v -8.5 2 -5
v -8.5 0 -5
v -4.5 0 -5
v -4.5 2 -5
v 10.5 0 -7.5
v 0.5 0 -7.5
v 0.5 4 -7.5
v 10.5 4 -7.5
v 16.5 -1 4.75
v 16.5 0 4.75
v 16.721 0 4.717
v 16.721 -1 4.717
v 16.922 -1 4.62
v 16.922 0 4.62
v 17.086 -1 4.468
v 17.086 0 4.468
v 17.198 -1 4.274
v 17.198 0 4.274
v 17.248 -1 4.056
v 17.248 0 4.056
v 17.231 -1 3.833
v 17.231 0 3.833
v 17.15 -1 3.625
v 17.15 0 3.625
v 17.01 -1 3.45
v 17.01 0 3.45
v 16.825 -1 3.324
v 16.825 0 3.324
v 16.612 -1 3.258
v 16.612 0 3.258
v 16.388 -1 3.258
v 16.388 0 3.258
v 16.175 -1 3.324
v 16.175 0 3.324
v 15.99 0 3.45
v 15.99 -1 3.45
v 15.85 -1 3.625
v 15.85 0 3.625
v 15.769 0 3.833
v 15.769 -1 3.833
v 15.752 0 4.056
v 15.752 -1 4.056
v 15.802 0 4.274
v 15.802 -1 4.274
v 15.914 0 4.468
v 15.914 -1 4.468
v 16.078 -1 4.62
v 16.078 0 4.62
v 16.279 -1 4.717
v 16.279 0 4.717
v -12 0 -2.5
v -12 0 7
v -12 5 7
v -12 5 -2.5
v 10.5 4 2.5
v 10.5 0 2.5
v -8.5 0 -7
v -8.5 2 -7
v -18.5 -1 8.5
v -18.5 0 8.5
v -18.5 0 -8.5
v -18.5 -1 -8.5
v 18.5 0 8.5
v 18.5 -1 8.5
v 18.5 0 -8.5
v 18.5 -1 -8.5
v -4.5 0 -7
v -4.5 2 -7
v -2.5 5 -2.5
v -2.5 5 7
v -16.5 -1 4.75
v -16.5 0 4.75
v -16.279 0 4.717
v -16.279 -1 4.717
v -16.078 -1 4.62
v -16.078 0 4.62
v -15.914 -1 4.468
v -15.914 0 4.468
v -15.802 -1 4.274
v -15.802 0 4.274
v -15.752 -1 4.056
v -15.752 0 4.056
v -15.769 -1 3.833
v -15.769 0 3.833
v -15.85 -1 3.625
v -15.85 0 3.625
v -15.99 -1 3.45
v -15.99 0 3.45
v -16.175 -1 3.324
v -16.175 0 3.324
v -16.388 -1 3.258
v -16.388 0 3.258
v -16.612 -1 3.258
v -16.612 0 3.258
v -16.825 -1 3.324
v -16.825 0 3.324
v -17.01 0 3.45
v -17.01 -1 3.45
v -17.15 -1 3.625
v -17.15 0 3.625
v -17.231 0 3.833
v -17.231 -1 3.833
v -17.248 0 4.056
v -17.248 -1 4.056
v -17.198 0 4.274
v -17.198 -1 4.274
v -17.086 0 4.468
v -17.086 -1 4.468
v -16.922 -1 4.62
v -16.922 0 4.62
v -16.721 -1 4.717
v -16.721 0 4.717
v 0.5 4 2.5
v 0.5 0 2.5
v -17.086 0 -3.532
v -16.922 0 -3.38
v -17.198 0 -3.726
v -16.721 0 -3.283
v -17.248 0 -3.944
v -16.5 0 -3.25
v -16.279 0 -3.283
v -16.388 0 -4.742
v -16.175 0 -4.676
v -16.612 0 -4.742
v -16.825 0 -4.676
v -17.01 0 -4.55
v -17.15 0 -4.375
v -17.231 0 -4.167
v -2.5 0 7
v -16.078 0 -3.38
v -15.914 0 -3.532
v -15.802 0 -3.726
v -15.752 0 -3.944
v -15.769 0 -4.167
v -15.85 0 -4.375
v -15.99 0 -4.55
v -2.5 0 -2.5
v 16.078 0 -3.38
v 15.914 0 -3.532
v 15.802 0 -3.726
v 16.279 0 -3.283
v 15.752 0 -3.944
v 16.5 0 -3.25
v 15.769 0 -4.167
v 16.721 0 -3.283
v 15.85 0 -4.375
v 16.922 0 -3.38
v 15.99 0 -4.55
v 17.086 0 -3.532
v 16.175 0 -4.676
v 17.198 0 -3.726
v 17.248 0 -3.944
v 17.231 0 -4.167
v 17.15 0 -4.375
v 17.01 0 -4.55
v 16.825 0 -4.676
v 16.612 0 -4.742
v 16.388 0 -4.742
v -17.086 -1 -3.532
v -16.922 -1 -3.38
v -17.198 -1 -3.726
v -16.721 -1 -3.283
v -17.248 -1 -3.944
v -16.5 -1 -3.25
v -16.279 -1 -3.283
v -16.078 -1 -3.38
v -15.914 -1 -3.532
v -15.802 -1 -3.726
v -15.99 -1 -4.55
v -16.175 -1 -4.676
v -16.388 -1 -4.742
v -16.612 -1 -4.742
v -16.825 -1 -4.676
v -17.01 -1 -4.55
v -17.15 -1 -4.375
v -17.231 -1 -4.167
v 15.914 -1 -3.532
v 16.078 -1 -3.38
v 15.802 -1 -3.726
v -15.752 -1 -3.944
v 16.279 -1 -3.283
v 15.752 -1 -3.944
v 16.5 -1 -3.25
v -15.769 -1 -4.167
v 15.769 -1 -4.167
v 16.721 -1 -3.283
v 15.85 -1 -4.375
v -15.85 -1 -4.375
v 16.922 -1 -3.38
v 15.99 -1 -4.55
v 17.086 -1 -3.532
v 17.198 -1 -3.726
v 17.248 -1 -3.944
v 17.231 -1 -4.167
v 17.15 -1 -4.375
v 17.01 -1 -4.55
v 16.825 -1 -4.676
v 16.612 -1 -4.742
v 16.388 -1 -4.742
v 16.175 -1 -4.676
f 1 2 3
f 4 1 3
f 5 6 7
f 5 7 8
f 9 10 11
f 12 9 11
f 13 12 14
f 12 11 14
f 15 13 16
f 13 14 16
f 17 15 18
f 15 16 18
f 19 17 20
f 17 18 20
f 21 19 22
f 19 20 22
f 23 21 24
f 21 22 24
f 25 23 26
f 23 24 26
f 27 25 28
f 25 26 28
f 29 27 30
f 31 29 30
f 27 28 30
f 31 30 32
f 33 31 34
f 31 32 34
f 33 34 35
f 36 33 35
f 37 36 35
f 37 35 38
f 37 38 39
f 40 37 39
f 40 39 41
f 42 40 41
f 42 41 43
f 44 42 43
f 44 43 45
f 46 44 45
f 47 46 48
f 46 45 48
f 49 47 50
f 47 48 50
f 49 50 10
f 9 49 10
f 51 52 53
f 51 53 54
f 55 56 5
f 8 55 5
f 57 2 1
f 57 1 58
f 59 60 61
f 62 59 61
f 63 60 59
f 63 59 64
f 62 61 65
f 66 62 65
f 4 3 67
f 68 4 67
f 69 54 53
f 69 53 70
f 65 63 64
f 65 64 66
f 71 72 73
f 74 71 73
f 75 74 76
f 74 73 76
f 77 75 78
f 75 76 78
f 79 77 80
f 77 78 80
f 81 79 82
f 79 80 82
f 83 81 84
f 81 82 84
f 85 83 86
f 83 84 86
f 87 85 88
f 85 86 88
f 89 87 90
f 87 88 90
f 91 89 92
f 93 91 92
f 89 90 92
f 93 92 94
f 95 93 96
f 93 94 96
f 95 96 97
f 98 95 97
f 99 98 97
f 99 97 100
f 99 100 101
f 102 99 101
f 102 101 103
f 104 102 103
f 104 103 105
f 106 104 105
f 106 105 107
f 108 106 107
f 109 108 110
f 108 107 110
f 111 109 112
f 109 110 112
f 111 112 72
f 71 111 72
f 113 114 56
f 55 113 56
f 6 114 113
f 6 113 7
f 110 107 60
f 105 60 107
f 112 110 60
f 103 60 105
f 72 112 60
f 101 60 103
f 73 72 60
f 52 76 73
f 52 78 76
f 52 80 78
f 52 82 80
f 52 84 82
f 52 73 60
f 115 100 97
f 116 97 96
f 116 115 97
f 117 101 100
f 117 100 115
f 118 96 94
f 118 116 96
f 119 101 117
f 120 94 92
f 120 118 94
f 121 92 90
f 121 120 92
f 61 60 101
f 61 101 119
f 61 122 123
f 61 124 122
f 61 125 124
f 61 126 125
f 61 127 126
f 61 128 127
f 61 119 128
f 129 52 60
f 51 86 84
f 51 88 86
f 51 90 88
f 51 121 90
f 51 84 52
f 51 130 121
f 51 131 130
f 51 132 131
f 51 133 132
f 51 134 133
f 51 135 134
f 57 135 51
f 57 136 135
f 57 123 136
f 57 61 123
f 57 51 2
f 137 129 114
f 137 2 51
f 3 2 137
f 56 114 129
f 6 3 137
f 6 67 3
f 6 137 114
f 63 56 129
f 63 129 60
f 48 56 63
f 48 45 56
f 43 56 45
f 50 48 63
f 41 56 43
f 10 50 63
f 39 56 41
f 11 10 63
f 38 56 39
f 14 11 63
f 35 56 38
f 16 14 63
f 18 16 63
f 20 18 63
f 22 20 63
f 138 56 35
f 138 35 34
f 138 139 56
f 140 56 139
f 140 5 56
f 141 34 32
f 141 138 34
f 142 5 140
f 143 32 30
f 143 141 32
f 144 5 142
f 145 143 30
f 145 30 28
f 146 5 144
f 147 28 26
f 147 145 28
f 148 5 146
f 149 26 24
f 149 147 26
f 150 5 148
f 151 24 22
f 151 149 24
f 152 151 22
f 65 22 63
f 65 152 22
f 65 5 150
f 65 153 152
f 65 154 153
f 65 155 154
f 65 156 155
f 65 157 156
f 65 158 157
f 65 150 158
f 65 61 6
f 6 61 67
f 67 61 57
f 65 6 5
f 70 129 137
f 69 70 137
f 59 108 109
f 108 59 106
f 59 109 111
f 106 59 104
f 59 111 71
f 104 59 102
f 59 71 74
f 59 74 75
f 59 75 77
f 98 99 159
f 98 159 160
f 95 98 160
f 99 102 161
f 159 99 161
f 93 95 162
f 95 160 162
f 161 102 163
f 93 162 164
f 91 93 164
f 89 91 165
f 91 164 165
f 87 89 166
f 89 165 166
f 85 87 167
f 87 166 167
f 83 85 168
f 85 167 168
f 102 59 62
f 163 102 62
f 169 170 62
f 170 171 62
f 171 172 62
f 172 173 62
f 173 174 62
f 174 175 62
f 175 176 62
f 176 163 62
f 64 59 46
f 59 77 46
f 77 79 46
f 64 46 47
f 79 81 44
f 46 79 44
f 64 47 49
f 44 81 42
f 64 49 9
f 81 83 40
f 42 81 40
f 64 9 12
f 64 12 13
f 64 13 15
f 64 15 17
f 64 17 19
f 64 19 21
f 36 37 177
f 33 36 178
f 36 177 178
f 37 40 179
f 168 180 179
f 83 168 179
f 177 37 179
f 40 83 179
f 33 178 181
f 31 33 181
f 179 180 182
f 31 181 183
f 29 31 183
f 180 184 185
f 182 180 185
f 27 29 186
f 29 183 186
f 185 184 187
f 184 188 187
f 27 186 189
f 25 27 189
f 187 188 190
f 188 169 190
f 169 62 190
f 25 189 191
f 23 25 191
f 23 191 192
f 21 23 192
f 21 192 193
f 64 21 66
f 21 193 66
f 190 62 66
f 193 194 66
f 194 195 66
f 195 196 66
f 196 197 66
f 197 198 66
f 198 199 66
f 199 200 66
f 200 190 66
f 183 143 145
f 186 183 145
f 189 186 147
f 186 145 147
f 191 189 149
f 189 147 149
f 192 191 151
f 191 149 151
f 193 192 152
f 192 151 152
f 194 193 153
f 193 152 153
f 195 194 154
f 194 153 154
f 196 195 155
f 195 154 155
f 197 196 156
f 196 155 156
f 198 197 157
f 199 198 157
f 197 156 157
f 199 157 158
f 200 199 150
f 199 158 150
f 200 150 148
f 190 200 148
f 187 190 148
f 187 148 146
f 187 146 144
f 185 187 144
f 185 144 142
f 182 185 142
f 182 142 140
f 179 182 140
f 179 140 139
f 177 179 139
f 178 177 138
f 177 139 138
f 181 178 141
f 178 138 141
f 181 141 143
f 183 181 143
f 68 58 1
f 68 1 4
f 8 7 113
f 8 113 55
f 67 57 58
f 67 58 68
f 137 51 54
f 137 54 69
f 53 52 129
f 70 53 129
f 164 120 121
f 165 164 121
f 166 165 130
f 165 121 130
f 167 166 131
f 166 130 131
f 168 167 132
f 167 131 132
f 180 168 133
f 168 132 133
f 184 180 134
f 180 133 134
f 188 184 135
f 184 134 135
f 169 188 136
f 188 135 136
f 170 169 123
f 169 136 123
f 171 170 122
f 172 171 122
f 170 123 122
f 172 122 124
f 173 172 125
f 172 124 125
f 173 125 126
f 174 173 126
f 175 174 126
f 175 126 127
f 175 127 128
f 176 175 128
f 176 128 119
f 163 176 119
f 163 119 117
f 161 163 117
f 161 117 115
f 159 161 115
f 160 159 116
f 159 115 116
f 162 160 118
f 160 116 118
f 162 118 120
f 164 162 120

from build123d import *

# Parameters (mm, degrees)
SKETCH_1_W      = 37
SKETCH_1_H      = 17
SKETCH_1_R      = 0.75
EXTRUDE_1_DEPTH = 1
SKETCH_1_3_W    = 10
SKETCH_1_3_H    = 10
EXTRUDE_2_DEPTH = 4
SKETCH_1_4_W    = 9.5
SKETCH_1_4_H    = 9.5
EXTRUDE_3_DEPTH = 5
SKETCH_1_5_W    = 4
SKETCH_1_5_H    = 2
EXTRUDE_4_DEPTH = 2


with BuildPart() as part:
    # Эскиз1 → Бобышка-Вытянуть1 (new body)
    with BuildSketch(Plane(origin=(0, 0, 0), x_dir=(1, 0, 0), z_dir=(0, 1, 0))):
        Rectangle(SKETCH_1_W, SKETCH_1_H)
        with Locations((-16.5, -4)):
            Circle(SKETCH_1_R, mode=Mode.SUBTRACT)
        with Locations((16.5, -4)):
            Circle(SKETCH_1_R, mode=Mode.SUBTRACT)
        with Locations((-16.5, 4)):
            Circle(SKETCH_1_R, mode=Mode.SUBTRACT)
        with Locations((16.5, 4)):
            Circle(SKETCH_1_R, mode=Mode.SUBTRACT)
    extrude(amount=-EXTRUDE_1_DEPTH)

    # Эскиз1<3> → Бобышка-Вытянуть2 (add)
    with BuildSketch(Plane(origin=(0, 0, 0), x_dir=(1, 0, 0), z_dir=(0, 1, 0))):
        with Locations((5.5, 2.5)):
            Rectangle(SKETCH_1_3_W, SKETCH_1_3_H)
    extrude(amount=EXTRUDE_2_DEPTH)

    # Эскиз1<4> → Бобышка-Вытянуть3 (add)
    with BuildSketch(Plane(origin=(0, 0, 0), x_dir=(1, 0, 0), z_dir=(0, 1, 0))):
        with Locations((-7.25, -2.25)):
            Rectangle(SKETCH_1_4_W, SKETCH_1_4_H)
    extrude(amount=EXTRUDE_3_DEPTH)

    # Эскиз1<5> → Бобышка-Вытянуть4 (add)
    with BuildSketch(Plane(origin=(0, 0, 0), x_dir=(1, 0, 0), z_dir=(0, 1, 0))):
        with Locations((-6.5, 6)):
            Rectangle(SKETCH_1_5_W, SKETCH_1_5_H)
    extrude(amount=EXTRUDE_4_DEPTH)


solid = part.part
